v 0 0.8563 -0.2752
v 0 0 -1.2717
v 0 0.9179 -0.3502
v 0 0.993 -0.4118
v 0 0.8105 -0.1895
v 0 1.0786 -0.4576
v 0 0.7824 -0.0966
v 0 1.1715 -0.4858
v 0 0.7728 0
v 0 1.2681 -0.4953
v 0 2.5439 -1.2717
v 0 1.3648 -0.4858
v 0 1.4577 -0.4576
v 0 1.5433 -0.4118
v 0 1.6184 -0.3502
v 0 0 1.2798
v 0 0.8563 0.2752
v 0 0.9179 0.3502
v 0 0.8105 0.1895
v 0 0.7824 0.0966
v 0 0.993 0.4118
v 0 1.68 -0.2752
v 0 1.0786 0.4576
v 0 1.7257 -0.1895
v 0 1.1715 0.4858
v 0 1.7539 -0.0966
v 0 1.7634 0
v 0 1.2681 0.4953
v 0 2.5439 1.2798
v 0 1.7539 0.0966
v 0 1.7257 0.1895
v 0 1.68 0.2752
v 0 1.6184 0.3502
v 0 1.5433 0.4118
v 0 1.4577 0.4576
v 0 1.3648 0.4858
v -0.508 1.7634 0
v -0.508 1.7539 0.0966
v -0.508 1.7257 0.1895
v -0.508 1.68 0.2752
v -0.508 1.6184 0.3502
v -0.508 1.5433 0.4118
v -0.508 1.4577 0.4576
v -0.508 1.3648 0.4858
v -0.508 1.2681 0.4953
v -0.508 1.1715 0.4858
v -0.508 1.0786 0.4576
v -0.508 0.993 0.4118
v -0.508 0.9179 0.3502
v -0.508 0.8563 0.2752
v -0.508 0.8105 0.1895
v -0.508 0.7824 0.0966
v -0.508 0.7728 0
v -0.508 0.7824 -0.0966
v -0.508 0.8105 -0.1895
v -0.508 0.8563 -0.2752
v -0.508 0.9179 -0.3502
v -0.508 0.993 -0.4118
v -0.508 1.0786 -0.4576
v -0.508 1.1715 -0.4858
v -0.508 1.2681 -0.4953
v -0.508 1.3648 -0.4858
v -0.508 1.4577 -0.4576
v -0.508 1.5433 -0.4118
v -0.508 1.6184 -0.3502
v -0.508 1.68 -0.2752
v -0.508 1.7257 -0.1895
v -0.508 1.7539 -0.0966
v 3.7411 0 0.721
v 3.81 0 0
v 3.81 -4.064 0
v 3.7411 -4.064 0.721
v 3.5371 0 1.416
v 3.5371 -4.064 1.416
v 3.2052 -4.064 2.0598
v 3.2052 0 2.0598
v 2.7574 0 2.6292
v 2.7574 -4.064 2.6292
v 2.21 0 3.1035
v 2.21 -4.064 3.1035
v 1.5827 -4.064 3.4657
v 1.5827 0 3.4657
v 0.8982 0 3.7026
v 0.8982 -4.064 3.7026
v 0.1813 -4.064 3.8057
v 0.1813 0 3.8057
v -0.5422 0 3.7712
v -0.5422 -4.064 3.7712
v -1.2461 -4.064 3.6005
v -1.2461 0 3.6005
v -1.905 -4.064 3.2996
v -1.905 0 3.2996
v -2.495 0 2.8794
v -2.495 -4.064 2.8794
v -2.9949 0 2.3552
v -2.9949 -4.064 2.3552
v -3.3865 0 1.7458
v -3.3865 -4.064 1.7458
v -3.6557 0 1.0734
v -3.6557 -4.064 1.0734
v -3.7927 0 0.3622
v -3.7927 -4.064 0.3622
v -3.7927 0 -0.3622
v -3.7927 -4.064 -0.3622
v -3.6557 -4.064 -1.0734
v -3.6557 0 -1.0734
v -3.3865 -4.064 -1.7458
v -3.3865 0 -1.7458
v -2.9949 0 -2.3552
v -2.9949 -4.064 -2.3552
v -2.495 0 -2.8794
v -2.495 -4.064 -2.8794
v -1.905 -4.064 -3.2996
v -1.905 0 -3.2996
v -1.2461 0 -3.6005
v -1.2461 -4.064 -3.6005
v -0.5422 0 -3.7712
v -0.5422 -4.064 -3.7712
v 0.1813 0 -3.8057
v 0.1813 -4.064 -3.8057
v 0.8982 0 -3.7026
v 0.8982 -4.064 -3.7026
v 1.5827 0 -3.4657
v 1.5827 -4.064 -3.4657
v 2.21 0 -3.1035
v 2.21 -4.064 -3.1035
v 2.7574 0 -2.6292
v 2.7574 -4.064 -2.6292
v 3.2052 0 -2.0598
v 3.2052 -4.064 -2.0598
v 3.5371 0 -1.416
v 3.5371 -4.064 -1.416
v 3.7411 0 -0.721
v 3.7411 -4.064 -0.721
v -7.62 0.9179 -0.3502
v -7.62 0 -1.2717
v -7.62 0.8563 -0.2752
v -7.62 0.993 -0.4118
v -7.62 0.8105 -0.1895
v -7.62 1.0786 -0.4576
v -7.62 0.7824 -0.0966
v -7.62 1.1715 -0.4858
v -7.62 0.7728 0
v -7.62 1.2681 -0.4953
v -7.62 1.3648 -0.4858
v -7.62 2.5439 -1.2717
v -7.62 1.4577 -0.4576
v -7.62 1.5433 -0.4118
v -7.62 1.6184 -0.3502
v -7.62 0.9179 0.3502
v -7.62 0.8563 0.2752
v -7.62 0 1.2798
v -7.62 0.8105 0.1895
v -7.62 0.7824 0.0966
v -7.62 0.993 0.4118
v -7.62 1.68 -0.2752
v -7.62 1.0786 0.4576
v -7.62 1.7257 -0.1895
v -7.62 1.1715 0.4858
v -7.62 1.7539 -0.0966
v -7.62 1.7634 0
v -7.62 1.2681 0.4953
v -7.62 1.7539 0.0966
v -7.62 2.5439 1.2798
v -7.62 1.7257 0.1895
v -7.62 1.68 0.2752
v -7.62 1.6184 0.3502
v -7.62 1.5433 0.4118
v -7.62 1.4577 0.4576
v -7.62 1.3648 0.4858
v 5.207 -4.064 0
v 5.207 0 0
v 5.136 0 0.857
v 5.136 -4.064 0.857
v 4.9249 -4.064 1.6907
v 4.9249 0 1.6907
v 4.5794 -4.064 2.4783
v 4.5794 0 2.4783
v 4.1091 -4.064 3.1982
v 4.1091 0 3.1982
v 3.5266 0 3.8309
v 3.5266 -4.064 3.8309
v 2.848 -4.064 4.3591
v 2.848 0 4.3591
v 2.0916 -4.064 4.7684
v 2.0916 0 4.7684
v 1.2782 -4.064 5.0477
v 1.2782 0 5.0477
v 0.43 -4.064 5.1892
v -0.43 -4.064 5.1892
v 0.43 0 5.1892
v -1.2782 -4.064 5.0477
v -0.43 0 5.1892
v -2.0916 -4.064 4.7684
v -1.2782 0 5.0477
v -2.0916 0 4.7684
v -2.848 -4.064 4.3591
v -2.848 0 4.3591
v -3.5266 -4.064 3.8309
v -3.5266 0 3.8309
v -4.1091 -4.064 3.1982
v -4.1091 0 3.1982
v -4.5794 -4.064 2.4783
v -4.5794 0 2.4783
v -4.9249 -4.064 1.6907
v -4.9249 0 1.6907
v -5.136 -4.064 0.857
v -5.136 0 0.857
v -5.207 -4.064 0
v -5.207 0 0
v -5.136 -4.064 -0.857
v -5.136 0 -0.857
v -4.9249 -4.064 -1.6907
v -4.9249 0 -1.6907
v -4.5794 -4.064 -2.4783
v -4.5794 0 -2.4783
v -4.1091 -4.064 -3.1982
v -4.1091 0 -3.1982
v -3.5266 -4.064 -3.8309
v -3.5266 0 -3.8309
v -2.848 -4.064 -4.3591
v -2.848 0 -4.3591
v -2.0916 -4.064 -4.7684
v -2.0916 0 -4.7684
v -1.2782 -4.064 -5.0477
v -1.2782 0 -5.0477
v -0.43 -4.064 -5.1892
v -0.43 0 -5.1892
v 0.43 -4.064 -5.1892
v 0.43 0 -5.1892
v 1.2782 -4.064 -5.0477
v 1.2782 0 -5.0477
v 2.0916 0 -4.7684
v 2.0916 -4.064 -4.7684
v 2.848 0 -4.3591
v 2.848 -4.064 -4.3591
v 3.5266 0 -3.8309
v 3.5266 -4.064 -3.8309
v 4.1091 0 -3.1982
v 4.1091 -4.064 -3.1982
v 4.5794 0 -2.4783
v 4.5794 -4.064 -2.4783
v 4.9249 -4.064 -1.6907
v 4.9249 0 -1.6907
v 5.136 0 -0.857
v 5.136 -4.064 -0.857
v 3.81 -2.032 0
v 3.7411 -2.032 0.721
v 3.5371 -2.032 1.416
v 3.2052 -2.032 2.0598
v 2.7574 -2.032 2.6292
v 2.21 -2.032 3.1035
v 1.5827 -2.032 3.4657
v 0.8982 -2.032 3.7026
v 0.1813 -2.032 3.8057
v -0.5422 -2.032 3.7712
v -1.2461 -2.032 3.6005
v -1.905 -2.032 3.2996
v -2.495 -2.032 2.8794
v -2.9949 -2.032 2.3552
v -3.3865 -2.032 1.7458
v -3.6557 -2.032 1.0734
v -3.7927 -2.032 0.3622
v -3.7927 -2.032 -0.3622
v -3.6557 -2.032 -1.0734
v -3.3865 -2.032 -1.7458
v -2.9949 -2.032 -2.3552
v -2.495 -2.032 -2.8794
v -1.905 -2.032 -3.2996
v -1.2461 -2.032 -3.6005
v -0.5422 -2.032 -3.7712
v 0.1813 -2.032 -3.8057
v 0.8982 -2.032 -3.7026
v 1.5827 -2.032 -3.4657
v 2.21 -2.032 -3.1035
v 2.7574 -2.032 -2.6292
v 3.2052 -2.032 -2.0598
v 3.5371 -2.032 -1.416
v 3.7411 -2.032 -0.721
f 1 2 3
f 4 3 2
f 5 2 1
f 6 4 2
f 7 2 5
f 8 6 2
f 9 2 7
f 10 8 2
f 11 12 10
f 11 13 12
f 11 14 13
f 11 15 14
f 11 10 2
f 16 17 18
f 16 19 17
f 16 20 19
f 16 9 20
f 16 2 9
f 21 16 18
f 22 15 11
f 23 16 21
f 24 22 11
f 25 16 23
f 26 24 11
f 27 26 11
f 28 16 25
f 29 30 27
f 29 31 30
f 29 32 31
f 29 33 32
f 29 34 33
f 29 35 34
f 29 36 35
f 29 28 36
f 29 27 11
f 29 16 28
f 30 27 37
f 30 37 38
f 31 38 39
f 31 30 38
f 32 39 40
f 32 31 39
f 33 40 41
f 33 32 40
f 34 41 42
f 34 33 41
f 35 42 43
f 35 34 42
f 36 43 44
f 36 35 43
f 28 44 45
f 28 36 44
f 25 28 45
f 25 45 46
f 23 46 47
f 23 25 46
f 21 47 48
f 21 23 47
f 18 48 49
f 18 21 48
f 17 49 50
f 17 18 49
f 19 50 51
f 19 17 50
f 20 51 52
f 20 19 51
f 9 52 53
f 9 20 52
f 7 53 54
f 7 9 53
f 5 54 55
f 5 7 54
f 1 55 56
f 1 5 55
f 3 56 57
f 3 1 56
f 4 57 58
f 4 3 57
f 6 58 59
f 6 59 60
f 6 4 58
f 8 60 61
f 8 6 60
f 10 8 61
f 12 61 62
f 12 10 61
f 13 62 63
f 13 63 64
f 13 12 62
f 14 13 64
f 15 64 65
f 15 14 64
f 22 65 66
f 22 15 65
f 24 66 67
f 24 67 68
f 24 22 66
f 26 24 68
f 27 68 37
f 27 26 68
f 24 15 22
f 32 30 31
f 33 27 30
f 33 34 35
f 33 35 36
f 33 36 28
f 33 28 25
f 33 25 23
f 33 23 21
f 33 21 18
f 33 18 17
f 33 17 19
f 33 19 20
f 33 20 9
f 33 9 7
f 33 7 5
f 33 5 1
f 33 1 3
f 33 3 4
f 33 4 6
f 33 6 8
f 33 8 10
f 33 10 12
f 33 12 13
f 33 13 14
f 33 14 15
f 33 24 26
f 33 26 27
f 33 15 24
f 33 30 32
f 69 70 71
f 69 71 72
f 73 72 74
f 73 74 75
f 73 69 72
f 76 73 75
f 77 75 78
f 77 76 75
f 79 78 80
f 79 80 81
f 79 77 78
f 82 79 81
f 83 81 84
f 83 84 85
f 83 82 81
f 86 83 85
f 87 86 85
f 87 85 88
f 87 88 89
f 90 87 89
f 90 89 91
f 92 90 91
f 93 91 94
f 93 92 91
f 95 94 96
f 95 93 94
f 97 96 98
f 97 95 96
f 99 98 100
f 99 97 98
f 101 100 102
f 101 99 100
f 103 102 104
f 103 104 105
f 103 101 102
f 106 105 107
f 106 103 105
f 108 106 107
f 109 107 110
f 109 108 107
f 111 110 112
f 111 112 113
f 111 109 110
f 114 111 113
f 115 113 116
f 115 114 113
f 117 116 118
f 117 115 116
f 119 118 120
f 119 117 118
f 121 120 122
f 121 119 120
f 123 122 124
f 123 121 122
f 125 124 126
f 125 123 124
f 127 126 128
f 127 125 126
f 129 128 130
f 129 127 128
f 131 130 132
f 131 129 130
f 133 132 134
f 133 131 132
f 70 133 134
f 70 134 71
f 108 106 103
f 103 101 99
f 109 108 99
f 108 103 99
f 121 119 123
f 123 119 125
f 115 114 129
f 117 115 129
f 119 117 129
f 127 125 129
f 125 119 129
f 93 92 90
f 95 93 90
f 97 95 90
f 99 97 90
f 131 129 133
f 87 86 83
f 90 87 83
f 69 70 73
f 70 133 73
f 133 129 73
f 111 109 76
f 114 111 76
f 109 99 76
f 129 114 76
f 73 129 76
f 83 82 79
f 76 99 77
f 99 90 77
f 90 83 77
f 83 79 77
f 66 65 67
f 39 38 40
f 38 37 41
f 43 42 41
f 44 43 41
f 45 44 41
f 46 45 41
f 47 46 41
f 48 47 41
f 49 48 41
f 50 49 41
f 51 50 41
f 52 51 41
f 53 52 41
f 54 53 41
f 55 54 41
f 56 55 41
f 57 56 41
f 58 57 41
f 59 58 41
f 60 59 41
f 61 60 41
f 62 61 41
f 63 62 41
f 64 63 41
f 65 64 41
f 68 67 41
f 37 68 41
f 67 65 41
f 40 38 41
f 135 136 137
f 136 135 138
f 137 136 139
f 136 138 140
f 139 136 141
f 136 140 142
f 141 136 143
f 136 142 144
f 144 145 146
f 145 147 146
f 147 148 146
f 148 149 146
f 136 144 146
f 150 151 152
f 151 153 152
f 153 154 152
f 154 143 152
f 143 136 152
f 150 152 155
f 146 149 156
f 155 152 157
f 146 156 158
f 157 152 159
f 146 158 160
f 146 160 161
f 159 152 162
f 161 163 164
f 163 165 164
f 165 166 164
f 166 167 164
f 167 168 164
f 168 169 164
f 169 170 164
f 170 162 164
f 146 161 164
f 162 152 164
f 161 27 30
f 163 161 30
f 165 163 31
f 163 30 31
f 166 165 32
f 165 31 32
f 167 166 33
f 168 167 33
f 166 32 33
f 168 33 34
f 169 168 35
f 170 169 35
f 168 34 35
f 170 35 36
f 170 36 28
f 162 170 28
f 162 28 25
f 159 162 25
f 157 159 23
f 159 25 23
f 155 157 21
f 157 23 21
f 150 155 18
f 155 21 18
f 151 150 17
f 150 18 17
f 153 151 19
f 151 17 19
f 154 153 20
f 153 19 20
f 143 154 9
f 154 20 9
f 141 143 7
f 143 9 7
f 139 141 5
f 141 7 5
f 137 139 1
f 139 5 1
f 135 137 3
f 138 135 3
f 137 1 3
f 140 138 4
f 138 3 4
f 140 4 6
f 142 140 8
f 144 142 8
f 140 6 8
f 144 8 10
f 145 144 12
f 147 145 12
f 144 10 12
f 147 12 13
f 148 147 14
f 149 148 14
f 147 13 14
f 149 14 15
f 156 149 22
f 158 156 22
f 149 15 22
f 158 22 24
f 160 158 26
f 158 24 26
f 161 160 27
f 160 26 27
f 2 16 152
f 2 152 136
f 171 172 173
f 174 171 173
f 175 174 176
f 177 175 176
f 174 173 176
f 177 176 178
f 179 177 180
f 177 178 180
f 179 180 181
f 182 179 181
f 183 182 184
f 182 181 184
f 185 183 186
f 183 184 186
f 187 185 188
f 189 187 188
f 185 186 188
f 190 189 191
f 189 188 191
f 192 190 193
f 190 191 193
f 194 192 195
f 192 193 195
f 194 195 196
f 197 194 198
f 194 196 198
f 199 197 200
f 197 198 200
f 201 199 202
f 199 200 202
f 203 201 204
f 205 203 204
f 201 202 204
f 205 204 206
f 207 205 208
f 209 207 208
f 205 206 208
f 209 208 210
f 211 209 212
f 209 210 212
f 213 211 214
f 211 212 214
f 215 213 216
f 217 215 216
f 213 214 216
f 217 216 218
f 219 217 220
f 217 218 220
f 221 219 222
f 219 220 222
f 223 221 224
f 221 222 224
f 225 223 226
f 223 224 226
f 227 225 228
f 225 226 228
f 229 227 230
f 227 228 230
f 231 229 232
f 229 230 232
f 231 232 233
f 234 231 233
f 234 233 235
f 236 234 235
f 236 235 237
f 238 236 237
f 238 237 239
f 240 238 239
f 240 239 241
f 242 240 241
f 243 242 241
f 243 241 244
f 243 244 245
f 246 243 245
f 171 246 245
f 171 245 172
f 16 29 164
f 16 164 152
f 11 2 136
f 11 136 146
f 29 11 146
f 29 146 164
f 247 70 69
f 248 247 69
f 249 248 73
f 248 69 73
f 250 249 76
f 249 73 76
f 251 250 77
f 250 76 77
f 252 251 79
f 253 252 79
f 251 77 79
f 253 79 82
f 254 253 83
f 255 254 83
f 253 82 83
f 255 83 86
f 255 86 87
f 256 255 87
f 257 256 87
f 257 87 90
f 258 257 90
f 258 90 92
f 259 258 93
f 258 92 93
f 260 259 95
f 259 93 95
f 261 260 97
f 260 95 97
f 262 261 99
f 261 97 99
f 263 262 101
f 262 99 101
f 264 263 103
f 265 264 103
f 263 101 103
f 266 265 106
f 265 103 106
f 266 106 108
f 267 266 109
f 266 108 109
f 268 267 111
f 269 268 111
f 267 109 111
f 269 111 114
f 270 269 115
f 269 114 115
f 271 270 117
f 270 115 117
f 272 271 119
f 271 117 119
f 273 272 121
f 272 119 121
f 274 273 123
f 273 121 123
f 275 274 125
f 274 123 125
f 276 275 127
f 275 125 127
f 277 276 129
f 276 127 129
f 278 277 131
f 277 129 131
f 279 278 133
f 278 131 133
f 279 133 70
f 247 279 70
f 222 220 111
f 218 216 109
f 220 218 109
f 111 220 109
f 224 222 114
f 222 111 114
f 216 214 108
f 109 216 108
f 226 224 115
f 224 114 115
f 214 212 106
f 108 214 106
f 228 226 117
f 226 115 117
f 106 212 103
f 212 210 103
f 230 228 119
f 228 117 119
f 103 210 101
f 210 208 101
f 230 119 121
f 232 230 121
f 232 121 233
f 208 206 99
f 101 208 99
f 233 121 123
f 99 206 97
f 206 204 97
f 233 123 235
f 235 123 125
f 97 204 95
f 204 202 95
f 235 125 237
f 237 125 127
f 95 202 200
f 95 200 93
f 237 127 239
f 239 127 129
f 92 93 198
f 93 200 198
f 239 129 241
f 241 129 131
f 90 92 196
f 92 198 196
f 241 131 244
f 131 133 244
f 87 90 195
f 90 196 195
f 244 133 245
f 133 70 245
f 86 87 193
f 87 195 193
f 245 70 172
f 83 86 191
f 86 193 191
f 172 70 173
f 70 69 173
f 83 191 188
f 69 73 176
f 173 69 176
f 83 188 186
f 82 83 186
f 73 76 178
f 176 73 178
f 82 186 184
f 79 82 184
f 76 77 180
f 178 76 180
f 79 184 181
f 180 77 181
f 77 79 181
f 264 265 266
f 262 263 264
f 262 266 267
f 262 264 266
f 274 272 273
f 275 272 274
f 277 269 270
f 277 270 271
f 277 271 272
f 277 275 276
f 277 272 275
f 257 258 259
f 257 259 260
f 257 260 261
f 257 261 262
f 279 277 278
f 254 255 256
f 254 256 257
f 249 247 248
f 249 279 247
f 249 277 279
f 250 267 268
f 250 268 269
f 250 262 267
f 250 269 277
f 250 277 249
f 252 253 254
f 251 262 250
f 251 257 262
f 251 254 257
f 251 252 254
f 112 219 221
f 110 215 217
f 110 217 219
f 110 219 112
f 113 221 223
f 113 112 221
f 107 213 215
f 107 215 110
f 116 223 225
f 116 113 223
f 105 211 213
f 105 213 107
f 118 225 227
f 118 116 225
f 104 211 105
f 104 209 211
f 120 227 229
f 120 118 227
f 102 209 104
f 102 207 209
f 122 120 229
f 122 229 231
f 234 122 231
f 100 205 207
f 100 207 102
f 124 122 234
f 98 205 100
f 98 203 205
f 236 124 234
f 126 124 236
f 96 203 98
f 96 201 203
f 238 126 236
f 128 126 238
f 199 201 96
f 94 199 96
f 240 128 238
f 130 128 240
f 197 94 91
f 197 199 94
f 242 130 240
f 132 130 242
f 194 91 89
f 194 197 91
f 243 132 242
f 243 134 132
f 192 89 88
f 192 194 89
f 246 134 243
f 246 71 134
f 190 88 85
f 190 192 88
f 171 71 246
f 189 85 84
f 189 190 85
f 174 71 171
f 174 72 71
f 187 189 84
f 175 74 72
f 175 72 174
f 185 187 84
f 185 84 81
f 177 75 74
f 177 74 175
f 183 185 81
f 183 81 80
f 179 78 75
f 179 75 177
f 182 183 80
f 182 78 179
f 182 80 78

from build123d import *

# Parameters (mm, degrees)
F0_R     = 5.207
F0_R_2   = 3.81
F1_DEPTH = 4.064
F2_DEPTH = 2.032
F3_R     = 0.4953
F4_DEPTH = 0.508
F5_DEPTH = 7.62


with BuildPart() as f1:
    # F0 (on Front) → F1 (new body)
    with BuildSketch(Plane.XZ):
        Circle(F0_R)
        Circle(F0_R_2, mode=Mode.SUBTRACT)
    extrude(amount=F1_DEPTH)


with BuildPart() as f2:
    # F0 (on Front) → F2 (new body)
    with BuildSketch(Plane.XZ):
        Circle(F0_R_2)
    extrude(amount=F2_DEPTH)


with BuildPart() as f4:
    # F3 (on Right) → F4 (new body)
    with BuildSketch(Plane.YZ):
        with Locations((1.268141, 0)):
            Circle(F3_R)
    extrude(amount=-F4_DEPTH)


with BuildPart() as f5:
    # F3 (on Right) → F5 (new body)
    with BuildSketch(Plane.YZ):
        Polygon((0, 1.279791), (0, 0), (0, -1.271651), (2.543863, -1.271651), (2.543863, 1.279791), align=None)
        with Locations((1.268141, 0)):
            Circle(F3_R, mode=Mode.SUBTRACT)
    extrude(amount=-F5_DEPTH)


solid = Compound([f1.part, f2.part, f4.part, f5.part])
